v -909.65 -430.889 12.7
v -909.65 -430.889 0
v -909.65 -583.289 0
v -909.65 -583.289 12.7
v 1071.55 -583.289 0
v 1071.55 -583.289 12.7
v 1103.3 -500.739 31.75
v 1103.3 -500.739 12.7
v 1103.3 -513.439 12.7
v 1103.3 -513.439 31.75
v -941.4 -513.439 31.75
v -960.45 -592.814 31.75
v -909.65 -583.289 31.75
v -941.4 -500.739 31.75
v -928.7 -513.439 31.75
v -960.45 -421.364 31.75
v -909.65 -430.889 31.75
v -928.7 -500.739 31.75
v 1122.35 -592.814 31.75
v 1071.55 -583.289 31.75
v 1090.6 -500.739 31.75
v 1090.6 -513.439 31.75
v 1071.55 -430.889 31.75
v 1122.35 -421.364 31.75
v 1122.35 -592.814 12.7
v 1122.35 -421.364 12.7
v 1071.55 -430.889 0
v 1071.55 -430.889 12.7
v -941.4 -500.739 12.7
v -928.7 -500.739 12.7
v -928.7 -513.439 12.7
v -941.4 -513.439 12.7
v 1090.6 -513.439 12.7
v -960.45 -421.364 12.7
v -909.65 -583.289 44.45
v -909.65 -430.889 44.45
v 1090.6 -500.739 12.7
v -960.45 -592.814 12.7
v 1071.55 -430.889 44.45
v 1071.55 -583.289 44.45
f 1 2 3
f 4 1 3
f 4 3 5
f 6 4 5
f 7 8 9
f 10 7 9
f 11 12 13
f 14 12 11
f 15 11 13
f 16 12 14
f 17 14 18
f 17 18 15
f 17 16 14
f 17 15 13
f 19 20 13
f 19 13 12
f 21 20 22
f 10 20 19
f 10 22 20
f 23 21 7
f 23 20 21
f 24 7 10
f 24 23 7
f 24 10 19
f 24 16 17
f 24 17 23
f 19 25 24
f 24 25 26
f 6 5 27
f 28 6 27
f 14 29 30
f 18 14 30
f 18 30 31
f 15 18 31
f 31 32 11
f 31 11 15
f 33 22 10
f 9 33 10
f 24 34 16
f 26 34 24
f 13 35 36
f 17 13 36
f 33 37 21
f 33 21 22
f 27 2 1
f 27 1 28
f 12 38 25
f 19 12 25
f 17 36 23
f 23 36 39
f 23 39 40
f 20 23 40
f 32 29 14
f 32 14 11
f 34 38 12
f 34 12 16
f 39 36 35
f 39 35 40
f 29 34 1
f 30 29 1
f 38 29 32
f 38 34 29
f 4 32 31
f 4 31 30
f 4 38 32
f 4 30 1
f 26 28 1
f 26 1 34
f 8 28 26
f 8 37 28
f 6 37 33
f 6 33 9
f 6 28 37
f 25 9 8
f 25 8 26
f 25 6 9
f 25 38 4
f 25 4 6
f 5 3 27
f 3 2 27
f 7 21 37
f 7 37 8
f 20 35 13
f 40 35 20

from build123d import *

# Parameters (mm, degrees)
F0_W     = 2082.8
F0_H     = 171.45
F1_DEPTH = 44.45
F2_W     = 1981.2
F2_H     = 9.525
F3_DEPTH = 12.7
F4_W     = 1981.2
F4_H     = 9.525
F5_DEPTH = 12.7
F6_W     = 12.7
F6_H     = 12.7
F7_DEPTH = 31.751


with BuildPart() as f1:
    # F0 (on Top) → F1 (new body)
    with BuildSketch(Plane.XY):
        with Locations((80.949743, -507.08936)):
            Rectangle(F0_W, F0_H)
    extrude(amount=F1_DEPTH)

    # F2 (on face) → F3 (cut)
    with BuildSketch(Plane(origin=(0, 0, 0), x_dir=(1, 0, 0), z_dir=(0, 0, -1))):
        Polygon((-960.450257, 592.81436), (-960.450257, 421.36436), (-909.650257, 421.36436), (-909.650257, 430.88936), (-909.650257, 583.28936), (-909.650257, 592.81436), align=None)
        with Locations((80.949743, 426.12686)):
            Rectangle(F2_W, F2_H)
        Polygon((1071.549743, 430.88936), (1071.549743, 421.36436), (1122.349743, 421.36436), (1122.349743, 592.81436), (1071.549743, 592.81436), (1071.549743, 583.28936), align=None)
        with Locations((80.949743, 588.05186)):
            Rectangle(F2_W, F2_H)
    extrude(amount=-F3_DEPTH, mode=Mode.SUBTRACT)

    # F4 (on face) → F5 (cut)
    with BuildSketch(Plane.XY.offset(44.45)):
        Polygon((1122.349743, -421.36436), (1071.549743, -421.36436), (1071.549743, -430.88936), (1071.549743, -583.28936), (1071.549743, -592.81436), (1122.349743, -592.81436), align=None)
        with Locations((80.949743, -426.12686)):
            Rectangle(F4_W, F4_H)
        Polygon((-909.650257, -430.88936), (-909.650257, -421.36436), (-960.450257, -421.36436), (-960.450257, -592.81436), (-909.650257, -592.81436), (-909.650257, -583.28936), align=None)
        with Locations((80.949743, -588.05186)):
            Rectangle(F4_W, F4_H)
    extrude(amount=-F5_DEPTH, mode=Mode.SUBTRACT)

    # F6 (on face) → F7 (cut, through all)
    with BuildSketch(Plane(origin=(0, 0, 12.7), x_dir=(1, 0, 0), z_dir=(0, 0, -1))):
        with Locations((-935.050257, 507.08936)):
            Rectangle(F6_W, F6_H)
        with Locations((1096.949743, 507.08936)):
            Rectangle(F6_W, F6_H)
    extrude(amount=-F7_DEPTH, mode=Mode.SUBTRACT)


solid = f1.part
